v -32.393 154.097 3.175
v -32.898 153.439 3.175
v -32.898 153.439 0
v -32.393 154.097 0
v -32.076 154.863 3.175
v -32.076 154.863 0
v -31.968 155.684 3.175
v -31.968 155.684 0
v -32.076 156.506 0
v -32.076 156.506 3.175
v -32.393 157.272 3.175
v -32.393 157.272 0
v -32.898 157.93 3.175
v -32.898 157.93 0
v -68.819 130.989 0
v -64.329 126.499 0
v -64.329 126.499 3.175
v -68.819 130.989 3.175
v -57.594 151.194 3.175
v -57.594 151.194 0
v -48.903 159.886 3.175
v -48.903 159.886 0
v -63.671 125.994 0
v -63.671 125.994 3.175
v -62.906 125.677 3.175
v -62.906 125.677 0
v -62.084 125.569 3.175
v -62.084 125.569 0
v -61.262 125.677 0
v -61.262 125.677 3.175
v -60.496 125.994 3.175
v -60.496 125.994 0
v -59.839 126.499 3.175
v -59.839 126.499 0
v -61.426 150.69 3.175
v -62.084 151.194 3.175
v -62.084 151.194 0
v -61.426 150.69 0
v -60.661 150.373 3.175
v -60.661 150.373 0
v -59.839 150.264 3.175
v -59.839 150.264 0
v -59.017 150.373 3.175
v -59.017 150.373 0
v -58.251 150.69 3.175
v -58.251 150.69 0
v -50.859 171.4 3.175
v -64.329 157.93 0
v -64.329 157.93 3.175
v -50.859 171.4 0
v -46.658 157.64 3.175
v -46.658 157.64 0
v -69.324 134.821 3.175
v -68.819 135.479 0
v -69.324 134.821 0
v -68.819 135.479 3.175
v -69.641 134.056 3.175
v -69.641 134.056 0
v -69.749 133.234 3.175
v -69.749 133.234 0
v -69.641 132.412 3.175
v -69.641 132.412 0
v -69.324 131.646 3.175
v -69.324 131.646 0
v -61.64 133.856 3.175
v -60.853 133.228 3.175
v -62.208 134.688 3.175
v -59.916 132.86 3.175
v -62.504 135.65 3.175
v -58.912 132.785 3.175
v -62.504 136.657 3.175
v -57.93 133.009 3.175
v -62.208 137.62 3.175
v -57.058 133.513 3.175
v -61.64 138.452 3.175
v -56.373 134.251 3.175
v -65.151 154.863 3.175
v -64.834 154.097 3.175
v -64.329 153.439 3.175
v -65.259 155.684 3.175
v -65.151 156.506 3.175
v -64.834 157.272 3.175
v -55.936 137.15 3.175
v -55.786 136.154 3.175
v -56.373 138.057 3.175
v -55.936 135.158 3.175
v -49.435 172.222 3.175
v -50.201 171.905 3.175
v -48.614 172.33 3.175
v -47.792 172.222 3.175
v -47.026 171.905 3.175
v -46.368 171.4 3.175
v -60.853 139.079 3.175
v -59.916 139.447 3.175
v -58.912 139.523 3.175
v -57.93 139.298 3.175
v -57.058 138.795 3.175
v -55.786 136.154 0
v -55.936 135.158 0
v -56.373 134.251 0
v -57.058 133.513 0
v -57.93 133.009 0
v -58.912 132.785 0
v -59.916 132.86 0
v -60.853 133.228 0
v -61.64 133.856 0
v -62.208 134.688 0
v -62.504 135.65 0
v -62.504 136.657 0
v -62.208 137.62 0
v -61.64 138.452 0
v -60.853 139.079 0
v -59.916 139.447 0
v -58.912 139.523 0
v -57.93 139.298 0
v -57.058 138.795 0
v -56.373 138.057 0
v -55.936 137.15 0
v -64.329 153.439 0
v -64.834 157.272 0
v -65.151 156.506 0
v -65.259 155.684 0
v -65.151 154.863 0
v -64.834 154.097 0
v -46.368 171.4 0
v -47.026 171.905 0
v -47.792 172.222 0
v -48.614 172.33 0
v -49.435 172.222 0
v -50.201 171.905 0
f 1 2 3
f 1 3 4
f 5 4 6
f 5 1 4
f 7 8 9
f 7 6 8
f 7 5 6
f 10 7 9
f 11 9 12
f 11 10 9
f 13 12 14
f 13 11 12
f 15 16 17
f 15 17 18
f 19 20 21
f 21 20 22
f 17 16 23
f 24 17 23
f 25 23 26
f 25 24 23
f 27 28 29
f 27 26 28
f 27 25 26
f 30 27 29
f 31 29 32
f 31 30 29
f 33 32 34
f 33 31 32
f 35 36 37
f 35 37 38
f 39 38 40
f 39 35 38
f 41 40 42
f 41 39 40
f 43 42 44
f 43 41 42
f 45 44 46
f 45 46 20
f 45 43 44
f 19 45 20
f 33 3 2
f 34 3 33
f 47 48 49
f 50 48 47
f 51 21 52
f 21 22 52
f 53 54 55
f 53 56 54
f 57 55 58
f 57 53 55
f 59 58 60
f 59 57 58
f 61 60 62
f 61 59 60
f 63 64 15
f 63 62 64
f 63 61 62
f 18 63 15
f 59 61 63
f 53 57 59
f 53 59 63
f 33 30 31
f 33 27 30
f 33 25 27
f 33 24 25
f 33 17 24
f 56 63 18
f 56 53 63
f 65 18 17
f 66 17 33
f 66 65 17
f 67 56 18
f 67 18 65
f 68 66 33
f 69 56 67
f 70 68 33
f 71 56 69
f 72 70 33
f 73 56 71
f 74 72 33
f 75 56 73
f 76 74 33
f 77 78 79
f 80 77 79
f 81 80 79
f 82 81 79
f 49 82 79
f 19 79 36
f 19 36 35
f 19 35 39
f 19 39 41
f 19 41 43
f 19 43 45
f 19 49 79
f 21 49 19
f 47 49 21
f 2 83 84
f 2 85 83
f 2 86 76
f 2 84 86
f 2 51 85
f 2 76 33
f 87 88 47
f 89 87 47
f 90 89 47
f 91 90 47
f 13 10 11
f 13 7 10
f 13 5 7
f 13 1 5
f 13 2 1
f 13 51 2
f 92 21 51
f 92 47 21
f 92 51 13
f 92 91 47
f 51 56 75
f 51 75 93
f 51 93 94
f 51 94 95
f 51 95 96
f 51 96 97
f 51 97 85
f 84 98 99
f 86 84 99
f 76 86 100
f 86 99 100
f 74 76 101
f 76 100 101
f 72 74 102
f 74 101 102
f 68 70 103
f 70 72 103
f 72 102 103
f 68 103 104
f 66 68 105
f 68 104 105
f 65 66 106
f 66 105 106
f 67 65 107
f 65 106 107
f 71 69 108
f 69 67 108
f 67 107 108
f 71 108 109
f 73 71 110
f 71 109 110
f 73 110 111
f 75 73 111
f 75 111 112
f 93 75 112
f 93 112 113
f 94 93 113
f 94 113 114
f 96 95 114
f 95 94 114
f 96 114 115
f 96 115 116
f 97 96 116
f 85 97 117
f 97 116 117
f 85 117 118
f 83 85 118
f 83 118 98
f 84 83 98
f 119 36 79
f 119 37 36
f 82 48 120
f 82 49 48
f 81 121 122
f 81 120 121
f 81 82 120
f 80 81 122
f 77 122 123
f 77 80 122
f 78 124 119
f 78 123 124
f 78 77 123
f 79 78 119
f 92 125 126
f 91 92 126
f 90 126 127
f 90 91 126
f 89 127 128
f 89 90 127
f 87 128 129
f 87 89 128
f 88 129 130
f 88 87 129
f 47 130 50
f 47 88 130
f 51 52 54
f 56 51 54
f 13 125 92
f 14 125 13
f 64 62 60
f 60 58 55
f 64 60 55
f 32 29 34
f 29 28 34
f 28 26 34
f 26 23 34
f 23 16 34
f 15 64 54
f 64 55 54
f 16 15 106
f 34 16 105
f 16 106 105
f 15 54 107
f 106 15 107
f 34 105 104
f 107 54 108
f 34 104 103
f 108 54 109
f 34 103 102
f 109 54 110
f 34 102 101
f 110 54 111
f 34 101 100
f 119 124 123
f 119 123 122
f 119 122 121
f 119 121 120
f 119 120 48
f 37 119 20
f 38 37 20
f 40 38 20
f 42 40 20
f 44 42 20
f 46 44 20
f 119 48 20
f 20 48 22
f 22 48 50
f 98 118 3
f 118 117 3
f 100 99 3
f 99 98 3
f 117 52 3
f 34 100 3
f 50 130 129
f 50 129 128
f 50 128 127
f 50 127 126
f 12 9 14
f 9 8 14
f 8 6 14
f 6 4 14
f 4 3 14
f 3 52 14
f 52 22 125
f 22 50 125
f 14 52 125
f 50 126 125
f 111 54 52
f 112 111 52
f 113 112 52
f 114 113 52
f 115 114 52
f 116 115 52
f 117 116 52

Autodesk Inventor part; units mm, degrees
ref_plane "YZ Plane" through (0, 0, 0) normal (1, 0, 0) x (0, 1, 0)
ref_plane "XZ Plane" through (0, 0, 0) normal (0, 1, 0) x (-1, 0, 0)
ref_plane "XY Plane" through (0, 0, 0) normal (0, 0, 1) x (1, 0, 0)
sketch "Sketch1" plane through (0, 0, 0) normal (0, 0, 1) x (1, 0, 0)
  line L0 (-53.3927, 155.3954) -> (-51.1476, 153.1504) construction
  line L1 (-53.3927, 155.3954) -> (-73.3092, 135.4789) construction
  line L2 (-73.3092, 135.4789) -> (-71.0641, 133.2339) construction
  line L3 (-71.0641, 133.2339) -> (-51.1476, 153.1504) construction
  line L4 (-46.6575, 157.6405) -> (-51.1476, 153.1504) construction
  line L5 (-46.6575, 157.6405) -> (-48.9026, 159.8856) construction
  line L6 (-53.3927, 155.3954) -> (-48.9026, 159.8856) construction
  line L7 (-59.8388, 148.9493) -> (-66.574, 155.6845)
  line L8 (-66.574, 155.6845) -> (-48.6135, 173.645)
  line L9 (-48.6135, 173.645) -> (-30.653, 155.6845)
  line L10 (-30.653, 155.6845) -> (-62.0839, 124.2536)
  line L11 (-62.0839, 124.2536) -> (-71.0641, 133.2339)
  line L12 (-59.8388, 148.9493) -> (-48.9026, 159.8856)
  line L13 (-48.9026, 159.8856) -> (-46.6575, 157.6405)
  line L14 (-46.6575, 157.6405) -> (-71.0641, 133.2339)
  circle A0 centre (-59.164, 136.1538) radius 3.3782 projected
  point P0 (0, 0)
  dimension "d7" = 44.45
  dimension "d8" = 25.4
  dimension "d9" = 25.4
  dimension "d10" = 12.7
extrude "Extrusion1" add sketch "Sketch1" along normal blind 3.175
fillet "Fillet1" radius 3.175 6 edges at (-62.0839, 124.2536, 1.5875) (-59.8388, 148.9493, 1.5875) (-66.574, 155.6845, 1.5875) (-71.0641, 133.2339, 1.5875) (-48.6135, 173.645, 1.5875) (-30.653, 155.6845, 1.5875)
properties part number "V5 Conveyor Plate Bracket P3" material "Aluminum-6061"
